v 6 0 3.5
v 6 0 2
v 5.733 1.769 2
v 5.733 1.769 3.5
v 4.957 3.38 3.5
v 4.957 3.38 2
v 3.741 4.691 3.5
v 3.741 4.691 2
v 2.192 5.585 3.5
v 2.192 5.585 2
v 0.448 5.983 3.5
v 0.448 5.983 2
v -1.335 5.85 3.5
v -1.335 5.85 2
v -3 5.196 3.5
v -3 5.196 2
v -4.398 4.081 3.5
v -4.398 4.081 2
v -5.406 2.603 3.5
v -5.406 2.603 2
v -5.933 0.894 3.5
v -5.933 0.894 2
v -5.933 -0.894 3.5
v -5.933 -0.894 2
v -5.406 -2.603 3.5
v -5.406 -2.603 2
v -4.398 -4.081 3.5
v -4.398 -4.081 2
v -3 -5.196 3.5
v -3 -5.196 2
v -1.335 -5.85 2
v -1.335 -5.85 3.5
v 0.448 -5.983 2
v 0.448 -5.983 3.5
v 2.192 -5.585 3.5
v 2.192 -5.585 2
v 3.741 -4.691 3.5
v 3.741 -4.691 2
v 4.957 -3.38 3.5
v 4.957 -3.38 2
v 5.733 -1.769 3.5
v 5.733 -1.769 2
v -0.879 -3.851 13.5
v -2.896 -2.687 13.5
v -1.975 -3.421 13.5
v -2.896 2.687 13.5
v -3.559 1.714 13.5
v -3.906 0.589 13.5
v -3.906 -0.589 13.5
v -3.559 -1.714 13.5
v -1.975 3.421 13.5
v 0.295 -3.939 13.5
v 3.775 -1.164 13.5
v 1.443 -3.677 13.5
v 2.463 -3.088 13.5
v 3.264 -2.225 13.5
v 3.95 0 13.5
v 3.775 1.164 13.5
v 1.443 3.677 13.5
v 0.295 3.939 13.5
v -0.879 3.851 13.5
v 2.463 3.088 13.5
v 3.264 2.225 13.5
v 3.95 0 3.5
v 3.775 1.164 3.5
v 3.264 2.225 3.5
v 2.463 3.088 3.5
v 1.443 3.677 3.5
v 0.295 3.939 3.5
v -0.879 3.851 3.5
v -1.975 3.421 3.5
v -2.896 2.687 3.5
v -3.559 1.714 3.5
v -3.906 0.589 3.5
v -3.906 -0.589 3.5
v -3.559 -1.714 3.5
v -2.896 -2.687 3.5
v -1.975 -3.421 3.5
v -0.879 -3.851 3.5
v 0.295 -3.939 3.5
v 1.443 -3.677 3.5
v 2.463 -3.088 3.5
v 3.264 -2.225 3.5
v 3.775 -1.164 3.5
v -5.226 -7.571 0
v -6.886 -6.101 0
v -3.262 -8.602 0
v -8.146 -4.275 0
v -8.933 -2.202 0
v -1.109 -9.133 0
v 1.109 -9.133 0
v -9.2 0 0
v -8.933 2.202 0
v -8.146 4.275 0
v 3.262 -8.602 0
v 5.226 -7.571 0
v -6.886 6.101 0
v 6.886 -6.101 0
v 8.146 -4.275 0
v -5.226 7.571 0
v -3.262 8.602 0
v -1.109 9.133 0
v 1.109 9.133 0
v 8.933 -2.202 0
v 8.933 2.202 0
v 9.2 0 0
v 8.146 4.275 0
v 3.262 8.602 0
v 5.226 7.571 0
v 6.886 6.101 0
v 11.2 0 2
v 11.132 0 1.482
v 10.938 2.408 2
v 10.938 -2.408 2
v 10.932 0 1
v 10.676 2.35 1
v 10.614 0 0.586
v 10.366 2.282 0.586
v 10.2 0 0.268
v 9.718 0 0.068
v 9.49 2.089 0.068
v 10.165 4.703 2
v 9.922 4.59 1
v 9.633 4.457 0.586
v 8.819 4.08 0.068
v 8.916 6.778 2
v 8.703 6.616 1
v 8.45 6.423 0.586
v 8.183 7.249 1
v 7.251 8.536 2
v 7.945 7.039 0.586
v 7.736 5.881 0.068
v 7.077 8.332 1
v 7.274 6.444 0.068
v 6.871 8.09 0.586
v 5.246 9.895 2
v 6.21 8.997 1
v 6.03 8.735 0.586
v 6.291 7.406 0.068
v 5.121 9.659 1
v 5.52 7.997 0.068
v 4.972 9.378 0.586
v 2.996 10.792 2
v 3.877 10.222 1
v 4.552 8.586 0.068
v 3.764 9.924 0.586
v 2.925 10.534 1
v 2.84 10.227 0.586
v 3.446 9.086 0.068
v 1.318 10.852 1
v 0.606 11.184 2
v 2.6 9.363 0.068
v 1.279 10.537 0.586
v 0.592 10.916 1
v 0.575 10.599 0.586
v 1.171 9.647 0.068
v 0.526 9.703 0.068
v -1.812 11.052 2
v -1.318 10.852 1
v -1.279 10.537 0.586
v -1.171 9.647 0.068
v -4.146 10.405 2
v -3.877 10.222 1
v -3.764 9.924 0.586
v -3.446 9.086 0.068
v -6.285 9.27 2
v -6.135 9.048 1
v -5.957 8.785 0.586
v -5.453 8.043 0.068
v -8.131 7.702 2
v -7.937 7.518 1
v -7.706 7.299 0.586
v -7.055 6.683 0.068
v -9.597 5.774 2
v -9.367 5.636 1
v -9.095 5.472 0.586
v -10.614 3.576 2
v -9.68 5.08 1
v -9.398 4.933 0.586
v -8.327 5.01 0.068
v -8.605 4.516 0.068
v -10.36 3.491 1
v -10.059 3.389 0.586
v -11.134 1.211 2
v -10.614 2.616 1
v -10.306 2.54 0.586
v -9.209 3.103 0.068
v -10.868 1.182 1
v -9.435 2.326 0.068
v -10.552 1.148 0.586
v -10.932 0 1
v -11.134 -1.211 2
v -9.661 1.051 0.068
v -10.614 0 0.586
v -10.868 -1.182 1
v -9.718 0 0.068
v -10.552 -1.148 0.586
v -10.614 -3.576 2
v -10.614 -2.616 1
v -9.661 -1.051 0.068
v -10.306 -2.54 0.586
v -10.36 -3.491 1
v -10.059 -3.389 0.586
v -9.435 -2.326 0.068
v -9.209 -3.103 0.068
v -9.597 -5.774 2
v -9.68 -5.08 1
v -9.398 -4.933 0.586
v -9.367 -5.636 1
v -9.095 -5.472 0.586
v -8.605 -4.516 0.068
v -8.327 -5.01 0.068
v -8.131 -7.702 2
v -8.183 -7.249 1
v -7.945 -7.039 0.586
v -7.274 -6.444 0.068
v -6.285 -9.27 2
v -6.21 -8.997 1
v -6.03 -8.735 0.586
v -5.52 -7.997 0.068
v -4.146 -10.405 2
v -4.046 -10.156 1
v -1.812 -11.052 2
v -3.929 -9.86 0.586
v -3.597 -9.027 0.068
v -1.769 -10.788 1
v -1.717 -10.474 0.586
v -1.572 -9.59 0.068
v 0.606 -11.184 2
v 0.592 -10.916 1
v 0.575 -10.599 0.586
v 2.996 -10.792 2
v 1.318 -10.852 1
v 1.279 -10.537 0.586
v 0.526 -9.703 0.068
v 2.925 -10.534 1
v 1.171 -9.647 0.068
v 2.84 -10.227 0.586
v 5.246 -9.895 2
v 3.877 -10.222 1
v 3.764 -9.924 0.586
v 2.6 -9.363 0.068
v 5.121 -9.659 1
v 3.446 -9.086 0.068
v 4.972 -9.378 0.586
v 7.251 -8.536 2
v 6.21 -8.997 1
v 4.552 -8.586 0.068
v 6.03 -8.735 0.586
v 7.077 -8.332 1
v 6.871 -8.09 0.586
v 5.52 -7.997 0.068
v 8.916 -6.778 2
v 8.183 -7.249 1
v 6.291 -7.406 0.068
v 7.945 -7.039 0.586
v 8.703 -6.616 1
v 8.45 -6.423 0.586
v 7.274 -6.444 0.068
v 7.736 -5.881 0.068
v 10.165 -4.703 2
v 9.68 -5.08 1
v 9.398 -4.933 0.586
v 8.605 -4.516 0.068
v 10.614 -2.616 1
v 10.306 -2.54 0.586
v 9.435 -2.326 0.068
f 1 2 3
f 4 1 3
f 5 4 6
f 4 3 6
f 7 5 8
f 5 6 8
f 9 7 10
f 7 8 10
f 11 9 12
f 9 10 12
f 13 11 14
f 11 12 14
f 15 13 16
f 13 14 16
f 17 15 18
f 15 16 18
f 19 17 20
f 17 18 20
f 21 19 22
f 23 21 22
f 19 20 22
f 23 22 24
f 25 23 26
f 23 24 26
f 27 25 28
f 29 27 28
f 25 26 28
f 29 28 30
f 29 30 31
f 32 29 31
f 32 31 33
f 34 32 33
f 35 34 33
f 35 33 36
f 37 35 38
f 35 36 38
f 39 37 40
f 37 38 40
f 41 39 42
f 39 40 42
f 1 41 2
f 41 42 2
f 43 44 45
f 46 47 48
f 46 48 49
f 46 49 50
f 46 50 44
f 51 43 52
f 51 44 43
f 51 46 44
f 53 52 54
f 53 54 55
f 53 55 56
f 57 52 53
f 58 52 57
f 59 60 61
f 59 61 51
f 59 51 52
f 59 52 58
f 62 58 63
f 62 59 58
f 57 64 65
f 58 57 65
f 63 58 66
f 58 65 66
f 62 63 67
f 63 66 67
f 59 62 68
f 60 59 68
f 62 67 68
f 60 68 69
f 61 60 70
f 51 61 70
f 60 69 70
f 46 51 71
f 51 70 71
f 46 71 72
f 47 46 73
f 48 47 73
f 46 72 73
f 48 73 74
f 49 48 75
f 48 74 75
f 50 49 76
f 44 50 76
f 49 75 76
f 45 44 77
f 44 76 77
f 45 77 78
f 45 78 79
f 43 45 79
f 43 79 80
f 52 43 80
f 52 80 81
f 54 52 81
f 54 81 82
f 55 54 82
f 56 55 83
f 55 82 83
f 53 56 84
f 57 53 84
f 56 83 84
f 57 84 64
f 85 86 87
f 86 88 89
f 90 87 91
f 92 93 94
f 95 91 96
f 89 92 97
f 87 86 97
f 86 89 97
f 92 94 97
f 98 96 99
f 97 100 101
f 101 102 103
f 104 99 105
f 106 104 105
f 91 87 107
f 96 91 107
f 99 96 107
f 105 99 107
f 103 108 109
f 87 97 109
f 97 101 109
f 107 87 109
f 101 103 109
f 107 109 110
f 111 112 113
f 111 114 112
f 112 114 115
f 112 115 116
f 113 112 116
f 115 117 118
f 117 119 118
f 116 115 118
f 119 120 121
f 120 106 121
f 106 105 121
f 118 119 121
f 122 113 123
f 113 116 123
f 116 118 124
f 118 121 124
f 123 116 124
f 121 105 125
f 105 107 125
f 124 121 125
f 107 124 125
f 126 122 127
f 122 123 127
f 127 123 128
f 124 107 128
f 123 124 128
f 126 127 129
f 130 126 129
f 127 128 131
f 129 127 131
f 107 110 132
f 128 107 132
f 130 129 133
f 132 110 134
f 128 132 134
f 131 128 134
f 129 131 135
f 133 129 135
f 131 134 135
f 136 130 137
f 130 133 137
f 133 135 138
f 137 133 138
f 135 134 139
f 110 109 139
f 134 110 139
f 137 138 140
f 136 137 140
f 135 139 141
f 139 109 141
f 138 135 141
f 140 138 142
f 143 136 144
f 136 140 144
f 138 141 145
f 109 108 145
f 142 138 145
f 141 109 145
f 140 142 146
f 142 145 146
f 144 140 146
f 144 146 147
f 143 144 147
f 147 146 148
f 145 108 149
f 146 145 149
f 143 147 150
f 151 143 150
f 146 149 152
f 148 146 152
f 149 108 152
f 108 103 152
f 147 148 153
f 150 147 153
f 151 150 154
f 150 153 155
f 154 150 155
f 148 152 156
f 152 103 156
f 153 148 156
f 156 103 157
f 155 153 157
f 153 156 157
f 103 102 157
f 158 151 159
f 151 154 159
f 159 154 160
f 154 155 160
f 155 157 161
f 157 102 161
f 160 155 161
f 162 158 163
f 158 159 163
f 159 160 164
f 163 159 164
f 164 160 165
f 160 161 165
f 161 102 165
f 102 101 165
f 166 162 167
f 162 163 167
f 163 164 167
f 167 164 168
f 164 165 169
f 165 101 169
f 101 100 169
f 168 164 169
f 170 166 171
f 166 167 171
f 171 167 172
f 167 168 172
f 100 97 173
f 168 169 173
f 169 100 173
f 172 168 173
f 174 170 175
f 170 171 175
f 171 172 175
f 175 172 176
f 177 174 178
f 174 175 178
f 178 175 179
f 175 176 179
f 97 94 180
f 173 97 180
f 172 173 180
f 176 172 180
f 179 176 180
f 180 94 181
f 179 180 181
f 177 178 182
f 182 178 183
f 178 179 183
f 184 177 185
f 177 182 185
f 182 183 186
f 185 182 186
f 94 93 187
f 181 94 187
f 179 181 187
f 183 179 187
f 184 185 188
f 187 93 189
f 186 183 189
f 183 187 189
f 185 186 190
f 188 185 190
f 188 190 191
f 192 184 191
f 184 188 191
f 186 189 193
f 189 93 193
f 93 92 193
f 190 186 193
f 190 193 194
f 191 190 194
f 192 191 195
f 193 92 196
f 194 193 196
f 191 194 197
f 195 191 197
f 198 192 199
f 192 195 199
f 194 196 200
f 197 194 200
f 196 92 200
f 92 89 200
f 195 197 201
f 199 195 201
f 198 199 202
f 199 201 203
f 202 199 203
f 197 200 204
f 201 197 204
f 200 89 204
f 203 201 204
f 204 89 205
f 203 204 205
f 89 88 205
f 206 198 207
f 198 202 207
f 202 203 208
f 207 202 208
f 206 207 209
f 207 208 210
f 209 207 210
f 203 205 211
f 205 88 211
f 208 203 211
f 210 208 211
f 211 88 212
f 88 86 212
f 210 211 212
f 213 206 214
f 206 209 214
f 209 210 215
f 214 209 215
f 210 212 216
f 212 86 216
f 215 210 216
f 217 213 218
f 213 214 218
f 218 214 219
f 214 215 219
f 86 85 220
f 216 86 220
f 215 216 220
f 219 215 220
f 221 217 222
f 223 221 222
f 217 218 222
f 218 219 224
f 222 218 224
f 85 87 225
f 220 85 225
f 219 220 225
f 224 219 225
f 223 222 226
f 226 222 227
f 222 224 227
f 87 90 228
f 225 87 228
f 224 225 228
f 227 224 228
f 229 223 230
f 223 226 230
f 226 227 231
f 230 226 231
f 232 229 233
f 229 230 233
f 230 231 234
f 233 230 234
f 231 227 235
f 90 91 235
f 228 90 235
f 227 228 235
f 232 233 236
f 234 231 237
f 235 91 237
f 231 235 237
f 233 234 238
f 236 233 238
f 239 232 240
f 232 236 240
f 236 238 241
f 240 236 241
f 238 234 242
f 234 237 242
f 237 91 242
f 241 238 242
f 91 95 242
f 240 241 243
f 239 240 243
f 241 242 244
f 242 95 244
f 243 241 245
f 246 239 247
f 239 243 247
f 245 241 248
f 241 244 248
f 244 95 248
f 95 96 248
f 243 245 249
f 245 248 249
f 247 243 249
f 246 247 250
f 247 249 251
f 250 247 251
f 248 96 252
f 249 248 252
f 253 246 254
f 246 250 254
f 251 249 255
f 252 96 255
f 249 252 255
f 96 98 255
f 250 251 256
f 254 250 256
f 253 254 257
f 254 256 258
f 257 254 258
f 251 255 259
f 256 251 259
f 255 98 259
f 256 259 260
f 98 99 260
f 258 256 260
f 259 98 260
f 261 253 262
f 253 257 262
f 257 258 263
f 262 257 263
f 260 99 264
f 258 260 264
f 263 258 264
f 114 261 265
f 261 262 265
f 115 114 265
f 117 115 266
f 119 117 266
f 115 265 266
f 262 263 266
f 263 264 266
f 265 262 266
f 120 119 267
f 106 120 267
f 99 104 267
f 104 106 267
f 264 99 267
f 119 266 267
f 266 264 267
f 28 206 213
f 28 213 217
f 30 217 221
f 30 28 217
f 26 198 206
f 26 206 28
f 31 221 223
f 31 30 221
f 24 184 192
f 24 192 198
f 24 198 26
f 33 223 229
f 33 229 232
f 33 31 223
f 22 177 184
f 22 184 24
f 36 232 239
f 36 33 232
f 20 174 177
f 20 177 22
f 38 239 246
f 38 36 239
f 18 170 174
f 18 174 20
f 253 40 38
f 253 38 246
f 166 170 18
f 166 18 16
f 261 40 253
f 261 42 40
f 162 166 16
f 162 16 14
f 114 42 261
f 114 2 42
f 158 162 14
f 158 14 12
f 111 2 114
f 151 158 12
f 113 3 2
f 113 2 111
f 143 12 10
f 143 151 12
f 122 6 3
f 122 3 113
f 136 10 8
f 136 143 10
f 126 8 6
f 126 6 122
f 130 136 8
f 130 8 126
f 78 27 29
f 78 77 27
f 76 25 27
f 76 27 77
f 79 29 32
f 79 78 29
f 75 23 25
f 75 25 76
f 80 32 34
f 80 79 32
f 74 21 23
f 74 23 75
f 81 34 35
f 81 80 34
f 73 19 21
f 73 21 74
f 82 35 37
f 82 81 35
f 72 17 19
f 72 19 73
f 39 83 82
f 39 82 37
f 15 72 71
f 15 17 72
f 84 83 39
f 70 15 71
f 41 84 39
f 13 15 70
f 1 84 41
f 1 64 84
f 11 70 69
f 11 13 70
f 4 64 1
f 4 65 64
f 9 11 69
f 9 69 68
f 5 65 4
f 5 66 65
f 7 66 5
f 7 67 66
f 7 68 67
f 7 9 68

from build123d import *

# Parameters (mm, degrees)
F0_R     = 11.2
F1_DEPTH = 2
F2_R     = 6
F3_DEPTH = 1.5
F4_R     = 3.95
F5_DEPTH = 10
F6_R     = 1.99999


# Not quite as in the source:
# - a fillet or chamfer is up to 0.001 mm smaller than in the source, because OpenCascade refuses the exact size


with BuildPart() as f1:
    # F0 (on Top) → F1 (new body)
    with BuildSketch(Plane.XY):
        Circle(F0_R)
    extrude(amount=F1_DEPTH)

    # F2 (on face) → F3 (join)
    with BuildSketch(Plane.XY.offset(2)):
        Circle(F2_R)
    extrude(amount=F3_DEPTH)

    # F4 (on face) → F5 (join)
    with BuildSketch(Plane.XY.offset(3.5)):
        Circle(F4_R)
    extrude(amount=F5_DEPTH)

    # F6 (radius 2 in the source; OpenCascade refuses exactly that, so slightly less here)
    f6_edges = [f1.edges().sort_by_distance(p)[0] for p in [
        (-11.2, 0, 0),
    ]]
    fillet(f6_edges, radius=F6_R)


solid = f1.part
